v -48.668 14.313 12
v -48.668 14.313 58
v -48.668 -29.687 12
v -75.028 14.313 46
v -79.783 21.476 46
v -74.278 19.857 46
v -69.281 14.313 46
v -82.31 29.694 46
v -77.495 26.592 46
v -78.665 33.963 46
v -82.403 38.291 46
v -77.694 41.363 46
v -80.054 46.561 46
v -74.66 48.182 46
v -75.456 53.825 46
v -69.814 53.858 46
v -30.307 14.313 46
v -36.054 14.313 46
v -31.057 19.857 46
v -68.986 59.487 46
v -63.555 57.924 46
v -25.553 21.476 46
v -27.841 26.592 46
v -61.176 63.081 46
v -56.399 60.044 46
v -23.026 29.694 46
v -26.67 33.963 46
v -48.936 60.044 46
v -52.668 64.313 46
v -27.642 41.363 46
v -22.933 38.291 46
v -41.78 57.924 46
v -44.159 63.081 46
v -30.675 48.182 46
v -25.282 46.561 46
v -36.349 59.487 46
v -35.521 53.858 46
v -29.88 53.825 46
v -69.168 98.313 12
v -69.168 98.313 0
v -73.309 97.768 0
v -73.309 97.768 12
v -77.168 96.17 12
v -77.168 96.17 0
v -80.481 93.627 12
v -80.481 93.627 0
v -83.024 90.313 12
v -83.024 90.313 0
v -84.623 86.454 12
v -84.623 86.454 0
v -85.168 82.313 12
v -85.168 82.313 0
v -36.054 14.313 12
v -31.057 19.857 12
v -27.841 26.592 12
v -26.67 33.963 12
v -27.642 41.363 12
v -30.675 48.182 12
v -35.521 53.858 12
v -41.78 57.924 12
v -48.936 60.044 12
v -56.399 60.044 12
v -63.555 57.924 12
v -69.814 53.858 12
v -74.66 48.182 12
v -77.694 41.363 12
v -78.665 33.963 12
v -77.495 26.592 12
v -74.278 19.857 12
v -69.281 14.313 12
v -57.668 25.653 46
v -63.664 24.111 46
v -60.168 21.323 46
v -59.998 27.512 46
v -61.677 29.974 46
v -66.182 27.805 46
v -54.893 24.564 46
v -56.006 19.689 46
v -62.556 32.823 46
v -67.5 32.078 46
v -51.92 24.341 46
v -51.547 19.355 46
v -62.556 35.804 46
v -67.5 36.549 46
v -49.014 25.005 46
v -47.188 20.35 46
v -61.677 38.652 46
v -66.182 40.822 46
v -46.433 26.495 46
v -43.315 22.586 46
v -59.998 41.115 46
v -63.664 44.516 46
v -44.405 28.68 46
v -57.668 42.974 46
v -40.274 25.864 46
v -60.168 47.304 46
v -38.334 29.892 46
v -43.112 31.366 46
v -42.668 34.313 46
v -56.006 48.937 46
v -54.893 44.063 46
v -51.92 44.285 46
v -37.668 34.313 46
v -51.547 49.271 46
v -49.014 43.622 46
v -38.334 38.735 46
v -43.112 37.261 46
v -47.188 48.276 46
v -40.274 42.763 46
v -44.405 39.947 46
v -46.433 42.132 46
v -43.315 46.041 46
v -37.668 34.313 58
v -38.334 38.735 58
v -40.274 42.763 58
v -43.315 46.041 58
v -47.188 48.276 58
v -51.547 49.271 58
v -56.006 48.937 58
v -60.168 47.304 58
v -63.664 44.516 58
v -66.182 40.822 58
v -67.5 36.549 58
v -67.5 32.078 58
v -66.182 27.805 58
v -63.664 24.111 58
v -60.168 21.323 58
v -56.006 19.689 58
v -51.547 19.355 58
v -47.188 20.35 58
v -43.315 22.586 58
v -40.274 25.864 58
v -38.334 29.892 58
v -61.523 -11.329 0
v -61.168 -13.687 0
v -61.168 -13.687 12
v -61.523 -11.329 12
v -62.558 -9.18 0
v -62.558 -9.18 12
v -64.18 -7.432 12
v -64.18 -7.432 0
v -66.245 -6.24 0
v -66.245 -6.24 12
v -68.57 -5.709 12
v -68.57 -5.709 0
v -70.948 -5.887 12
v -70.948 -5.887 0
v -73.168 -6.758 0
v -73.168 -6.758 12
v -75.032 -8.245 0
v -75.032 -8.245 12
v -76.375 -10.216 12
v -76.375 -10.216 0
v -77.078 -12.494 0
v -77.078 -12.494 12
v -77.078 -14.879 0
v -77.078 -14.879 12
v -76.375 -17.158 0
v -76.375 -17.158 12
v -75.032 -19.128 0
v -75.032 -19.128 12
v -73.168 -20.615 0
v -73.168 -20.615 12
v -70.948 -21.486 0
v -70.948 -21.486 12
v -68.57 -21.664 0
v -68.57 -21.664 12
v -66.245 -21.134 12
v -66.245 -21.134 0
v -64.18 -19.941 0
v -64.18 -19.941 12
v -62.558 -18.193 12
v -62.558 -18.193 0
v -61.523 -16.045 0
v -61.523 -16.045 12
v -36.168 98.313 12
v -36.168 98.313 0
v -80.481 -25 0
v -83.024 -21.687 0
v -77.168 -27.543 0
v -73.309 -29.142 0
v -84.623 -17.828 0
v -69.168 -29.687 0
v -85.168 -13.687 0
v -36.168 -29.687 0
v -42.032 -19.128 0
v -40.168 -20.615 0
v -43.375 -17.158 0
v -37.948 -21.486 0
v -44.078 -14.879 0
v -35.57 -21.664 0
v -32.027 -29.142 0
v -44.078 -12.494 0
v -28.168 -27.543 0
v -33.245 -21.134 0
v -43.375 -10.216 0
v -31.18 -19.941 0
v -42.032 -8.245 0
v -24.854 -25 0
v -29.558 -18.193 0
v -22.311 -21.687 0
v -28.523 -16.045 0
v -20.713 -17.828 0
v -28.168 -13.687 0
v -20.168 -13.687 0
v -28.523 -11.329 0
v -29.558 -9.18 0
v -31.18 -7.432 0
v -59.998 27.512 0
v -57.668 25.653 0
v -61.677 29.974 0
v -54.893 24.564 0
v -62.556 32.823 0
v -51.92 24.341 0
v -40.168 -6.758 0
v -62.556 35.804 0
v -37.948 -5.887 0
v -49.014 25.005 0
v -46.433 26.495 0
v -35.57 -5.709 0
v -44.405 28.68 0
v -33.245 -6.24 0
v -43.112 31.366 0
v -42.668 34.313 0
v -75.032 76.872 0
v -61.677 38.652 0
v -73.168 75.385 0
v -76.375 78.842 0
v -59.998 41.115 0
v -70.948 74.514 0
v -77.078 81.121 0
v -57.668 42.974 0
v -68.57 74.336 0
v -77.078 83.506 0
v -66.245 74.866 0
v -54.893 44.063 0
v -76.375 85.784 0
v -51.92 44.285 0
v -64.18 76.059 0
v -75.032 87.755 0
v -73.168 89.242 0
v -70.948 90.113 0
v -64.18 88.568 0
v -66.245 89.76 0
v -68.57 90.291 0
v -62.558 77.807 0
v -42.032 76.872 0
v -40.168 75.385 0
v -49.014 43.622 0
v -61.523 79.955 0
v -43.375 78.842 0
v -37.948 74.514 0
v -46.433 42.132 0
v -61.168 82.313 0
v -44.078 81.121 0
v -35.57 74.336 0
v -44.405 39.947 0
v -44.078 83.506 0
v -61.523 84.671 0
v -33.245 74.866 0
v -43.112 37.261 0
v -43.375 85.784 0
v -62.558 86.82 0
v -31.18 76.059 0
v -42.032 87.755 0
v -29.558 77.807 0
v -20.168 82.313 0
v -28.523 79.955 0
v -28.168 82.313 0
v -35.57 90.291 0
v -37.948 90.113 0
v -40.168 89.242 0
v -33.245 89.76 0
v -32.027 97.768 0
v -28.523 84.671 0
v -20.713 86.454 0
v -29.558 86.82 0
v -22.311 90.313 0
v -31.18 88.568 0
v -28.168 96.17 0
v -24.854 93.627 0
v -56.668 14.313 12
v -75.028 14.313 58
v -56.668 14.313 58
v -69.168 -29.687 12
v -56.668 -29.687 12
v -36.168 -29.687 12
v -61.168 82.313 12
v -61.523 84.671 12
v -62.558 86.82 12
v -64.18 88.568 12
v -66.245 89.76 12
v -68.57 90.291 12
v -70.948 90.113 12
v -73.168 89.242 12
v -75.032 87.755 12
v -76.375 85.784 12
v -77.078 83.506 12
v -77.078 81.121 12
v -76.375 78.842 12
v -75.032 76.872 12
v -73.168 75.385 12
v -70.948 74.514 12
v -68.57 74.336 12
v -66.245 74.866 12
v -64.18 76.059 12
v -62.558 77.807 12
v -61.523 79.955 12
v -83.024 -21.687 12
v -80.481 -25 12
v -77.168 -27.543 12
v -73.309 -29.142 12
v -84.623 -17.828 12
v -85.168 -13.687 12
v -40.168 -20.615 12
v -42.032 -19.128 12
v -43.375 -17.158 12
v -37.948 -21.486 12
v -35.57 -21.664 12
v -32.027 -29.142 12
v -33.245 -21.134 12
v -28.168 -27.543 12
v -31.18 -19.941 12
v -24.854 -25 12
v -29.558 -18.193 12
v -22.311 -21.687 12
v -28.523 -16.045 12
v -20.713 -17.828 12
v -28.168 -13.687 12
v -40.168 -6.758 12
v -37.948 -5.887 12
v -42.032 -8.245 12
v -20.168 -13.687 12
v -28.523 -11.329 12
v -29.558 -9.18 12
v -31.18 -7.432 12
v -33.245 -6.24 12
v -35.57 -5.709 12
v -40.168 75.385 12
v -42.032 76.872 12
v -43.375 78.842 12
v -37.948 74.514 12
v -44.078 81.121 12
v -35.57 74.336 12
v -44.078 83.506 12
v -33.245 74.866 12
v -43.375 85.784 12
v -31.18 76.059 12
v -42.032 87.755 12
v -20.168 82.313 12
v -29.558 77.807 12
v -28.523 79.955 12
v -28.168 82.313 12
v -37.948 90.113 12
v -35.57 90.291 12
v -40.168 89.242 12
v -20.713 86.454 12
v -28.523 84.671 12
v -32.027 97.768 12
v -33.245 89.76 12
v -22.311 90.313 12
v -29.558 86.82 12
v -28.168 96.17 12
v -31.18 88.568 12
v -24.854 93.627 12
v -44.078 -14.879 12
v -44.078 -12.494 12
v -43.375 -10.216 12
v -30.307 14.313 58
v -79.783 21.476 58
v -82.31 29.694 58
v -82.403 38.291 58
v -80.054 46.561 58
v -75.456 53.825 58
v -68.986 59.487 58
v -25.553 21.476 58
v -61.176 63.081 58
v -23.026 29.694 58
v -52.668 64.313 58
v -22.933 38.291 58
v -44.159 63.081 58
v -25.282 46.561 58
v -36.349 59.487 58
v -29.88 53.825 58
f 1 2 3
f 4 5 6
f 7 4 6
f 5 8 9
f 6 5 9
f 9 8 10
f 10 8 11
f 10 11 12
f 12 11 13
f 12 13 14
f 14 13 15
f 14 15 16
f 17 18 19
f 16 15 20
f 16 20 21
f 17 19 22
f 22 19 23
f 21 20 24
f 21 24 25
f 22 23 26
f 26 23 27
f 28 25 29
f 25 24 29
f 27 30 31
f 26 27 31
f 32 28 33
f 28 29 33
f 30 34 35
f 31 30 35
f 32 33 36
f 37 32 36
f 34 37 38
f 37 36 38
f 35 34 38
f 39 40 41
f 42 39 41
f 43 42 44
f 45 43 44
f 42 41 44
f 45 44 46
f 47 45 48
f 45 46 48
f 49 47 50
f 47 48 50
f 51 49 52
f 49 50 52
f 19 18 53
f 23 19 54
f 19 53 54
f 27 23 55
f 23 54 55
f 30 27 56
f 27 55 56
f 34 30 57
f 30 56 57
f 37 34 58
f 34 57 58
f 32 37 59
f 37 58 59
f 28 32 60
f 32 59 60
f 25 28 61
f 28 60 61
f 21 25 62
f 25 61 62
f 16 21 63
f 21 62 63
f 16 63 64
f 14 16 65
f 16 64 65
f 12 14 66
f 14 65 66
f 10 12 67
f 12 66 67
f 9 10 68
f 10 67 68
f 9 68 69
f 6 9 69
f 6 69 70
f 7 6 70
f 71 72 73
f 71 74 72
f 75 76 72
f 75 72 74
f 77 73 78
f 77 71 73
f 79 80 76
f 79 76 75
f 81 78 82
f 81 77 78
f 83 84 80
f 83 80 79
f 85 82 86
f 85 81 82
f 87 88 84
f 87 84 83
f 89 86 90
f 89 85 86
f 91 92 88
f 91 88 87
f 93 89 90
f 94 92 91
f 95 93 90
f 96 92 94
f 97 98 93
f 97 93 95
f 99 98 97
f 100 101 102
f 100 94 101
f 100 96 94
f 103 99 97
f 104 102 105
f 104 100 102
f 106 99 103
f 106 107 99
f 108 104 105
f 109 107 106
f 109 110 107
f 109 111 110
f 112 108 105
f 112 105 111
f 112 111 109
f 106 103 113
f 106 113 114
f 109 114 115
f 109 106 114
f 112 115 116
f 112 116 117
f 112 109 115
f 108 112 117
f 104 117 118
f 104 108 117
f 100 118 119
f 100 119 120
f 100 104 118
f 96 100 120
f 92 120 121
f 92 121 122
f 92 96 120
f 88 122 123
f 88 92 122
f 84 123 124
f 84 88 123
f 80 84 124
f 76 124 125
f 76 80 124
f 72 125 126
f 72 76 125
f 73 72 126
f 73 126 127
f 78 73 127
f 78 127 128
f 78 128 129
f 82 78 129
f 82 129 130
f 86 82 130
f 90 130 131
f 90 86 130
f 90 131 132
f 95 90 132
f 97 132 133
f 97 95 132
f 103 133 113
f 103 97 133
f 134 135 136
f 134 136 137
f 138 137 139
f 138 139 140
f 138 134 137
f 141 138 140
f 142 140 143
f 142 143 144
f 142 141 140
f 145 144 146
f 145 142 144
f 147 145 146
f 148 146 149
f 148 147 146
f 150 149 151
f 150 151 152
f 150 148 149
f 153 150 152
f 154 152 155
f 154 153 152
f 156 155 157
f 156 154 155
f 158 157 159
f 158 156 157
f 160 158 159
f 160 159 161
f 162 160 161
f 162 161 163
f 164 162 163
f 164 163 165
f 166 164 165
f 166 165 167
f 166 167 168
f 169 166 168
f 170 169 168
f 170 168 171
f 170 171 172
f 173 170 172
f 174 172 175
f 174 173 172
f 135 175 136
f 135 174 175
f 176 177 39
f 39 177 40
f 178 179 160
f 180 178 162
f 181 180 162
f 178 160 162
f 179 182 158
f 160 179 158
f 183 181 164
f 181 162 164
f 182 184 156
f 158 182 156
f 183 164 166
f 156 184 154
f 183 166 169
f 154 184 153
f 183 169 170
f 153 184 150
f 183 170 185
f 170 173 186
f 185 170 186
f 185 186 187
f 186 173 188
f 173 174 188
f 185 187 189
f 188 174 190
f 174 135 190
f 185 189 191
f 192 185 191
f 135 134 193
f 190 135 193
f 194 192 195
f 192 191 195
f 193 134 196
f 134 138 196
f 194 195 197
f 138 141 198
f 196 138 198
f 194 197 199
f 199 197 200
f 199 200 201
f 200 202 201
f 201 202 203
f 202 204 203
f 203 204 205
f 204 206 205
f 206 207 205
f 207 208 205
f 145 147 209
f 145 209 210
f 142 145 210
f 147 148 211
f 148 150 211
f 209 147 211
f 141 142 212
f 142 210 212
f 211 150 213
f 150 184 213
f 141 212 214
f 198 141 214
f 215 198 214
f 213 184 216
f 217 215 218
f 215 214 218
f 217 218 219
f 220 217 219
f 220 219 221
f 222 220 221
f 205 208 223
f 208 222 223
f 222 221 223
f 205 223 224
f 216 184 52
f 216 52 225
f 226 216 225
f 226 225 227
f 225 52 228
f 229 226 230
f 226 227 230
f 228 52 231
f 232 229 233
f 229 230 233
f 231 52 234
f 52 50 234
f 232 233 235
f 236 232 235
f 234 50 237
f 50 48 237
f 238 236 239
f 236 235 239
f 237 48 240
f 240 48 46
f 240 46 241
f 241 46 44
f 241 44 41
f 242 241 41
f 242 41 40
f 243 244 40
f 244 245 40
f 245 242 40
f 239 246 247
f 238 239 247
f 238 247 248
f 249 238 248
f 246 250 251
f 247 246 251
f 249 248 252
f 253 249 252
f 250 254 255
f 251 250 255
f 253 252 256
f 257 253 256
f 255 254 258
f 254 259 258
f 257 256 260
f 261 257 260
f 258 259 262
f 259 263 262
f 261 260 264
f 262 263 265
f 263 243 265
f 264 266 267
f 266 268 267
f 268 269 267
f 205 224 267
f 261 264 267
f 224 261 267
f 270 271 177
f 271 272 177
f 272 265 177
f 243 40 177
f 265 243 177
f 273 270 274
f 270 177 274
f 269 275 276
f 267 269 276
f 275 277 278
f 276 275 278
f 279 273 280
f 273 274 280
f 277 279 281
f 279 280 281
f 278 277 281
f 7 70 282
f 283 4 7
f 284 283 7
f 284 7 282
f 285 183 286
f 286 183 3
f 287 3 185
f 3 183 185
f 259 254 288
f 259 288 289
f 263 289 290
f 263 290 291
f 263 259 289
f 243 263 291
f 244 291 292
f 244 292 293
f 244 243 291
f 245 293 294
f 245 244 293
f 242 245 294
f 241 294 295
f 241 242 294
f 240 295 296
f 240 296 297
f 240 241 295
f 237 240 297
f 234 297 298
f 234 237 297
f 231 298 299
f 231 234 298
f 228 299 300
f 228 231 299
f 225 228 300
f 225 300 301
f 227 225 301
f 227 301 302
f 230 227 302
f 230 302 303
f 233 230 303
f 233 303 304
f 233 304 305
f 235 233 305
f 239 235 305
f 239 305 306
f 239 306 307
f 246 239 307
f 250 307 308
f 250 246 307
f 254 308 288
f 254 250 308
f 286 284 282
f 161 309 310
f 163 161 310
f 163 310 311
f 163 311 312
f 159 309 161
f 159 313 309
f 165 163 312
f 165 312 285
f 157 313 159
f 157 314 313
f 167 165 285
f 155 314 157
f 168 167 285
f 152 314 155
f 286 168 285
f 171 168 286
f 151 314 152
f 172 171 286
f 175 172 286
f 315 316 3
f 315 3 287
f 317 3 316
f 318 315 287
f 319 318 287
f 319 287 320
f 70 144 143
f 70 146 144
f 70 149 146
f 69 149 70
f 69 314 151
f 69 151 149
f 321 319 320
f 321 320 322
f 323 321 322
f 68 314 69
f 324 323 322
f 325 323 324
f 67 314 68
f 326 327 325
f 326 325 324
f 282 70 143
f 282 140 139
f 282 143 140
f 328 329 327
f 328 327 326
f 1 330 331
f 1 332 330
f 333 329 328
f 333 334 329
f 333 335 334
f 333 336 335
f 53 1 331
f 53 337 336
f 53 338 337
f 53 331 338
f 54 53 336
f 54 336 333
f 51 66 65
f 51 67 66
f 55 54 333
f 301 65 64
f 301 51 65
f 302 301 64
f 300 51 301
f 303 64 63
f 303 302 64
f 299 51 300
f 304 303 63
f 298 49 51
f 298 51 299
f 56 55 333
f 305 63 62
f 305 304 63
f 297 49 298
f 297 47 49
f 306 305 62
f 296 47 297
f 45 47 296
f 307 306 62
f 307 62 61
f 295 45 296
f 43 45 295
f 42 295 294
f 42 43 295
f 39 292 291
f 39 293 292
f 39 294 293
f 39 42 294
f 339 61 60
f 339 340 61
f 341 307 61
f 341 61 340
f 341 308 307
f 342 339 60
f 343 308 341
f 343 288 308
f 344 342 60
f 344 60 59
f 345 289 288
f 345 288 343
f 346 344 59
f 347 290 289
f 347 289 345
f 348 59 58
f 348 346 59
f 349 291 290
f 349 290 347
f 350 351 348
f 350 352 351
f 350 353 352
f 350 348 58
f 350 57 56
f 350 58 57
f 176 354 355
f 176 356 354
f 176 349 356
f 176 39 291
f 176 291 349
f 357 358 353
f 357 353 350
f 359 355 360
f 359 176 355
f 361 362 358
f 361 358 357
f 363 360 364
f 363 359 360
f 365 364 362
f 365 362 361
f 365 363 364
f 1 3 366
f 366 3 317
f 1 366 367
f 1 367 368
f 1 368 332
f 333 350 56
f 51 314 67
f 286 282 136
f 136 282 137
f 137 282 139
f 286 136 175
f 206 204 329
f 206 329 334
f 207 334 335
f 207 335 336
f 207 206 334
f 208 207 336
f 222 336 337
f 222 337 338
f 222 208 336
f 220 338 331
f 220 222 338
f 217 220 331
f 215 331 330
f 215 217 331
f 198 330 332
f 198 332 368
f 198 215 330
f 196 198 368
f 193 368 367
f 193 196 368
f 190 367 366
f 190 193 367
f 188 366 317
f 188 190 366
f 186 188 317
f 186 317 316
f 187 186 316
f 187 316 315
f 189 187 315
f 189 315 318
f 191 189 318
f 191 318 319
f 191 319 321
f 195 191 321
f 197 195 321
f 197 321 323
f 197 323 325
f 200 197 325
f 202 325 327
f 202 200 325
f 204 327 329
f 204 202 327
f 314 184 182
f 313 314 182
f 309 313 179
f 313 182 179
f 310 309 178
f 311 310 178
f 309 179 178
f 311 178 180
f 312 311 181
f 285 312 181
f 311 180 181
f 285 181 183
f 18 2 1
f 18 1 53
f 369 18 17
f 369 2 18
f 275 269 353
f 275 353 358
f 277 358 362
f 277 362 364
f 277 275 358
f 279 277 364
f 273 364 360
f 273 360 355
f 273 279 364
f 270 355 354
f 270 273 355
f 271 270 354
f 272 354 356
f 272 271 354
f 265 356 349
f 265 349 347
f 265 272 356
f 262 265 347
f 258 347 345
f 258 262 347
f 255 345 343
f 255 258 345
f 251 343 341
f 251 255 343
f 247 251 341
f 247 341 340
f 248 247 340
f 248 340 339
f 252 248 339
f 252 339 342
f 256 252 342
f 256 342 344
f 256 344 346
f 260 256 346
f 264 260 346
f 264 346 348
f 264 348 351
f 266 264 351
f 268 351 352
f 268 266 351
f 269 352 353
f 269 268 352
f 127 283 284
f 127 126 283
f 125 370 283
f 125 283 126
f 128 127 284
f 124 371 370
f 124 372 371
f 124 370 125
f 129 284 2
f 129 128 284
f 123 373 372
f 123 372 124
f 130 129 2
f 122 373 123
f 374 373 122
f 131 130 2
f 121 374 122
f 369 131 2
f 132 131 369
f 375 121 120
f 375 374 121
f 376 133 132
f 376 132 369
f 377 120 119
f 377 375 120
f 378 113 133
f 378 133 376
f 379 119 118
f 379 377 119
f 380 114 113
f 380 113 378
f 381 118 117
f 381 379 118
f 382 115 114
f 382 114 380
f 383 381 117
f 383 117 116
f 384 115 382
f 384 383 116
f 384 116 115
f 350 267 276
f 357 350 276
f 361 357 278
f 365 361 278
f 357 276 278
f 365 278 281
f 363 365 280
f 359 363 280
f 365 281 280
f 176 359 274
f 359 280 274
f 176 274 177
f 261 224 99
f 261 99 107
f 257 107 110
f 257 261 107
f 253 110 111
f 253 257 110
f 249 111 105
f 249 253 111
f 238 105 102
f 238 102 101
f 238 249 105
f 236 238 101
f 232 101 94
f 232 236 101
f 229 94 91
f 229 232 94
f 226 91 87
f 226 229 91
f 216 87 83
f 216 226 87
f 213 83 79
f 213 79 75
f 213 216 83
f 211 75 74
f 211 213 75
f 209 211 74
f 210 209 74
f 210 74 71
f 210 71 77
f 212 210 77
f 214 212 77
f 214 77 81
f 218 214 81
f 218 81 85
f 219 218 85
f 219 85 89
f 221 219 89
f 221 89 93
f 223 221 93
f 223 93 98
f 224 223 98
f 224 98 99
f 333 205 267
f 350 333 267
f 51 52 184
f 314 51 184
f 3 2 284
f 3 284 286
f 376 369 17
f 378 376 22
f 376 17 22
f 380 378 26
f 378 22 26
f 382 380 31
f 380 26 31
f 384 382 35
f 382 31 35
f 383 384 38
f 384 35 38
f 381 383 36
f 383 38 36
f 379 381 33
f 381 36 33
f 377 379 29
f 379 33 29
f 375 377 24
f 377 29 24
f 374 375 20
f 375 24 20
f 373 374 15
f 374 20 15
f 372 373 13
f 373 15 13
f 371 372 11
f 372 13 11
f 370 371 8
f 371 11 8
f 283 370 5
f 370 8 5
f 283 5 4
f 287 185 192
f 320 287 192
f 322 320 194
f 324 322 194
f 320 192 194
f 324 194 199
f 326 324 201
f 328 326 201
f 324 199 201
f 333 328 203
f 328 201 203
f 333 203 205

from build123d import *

# Parameters (mm, degrees)
IZIM1_R                     = 8
Y_KSEKLIK_EKSTR_ZYON2_DEPTH = 12
IZIM2_R                     = 26
IZIM2_R_2                   = 10
Y_KSEKLIK_EKSTR_ZYON3_DEPTH = 34
KES_EKSTR_ZYON1_START       = -34
IZIM3_R                     = 10
KES_EKSTR_ZYON1_DEPTH       = 34
IZIM4_R                     = 30
IZIM4_R_2                   = 15
Y_KSEKLIK_EKSTR_ZYON4_DEPTH = 12
IZIM6_W                     = 47.489367516
IZIM6_H                     = 14.251313653
KES_EKSTR_ZYON2_DEPTH       = 46
FEDER1_REACH                = 120.683
IZIM9_WALL_W                = 303.022183262
IZIM9_WALL_H                = 8


with BuildPart() as part:
    # Çizim1 → Yükseklik-Ekstrüzyon2 (new body)
    with BuildSketch(Plane.XY):
        with BuildLine():
            Line((-85.16772712, 82.313308987), (-85.16772712, -13.686691013))
            ThreePointArc((-85.16772712, -13.686691013), (-80.481435619, -25.000399512), (-69.16772712, -29.686691013))
            Line((-69.16772712, -29.686691013), (-36.16772712, -29.686691013))
            ThreePointArc((-36.16772712, -29.686691013), (-24.854018621, -25.000399512), (-20.16772712, -13.686691013))
            Line((-20.16772712, -13.686691013), (-20.16772712, 82.313308987))
            ThreePointArc((-20.16772712, 82.313308987), (-24.854018621, 93.627017486), (-36.16772712, 98.313308987))
            Line((-36.16772712, 98.313308987), (-69.16772712, 98.313308987))
            ThreePointArc((-69.16772712, 98.313308987), (-80.481435619, 93.627017486), (-85.16772712, 82.313308987))
        make_face()
        with Locations((-69.16772712, 82.313308987)):
            Circle(IZIM1_R, mode=Mode.SUBTRACT)
        with Locations((-36.16772712, 82.313308987)):
            Circle(IZIM1_R, mode=Mode.SUBTRACT)
        with Locations((-69.16772712, -13.686691013)):
            Circle(IZIM1_R, mode=Mode.SUBTRACT)
        with Locations((-36.16772712, -13.686691013)):
            Circle(IZIM1_R, mode=Mode.SUBTRACT)
    extrude(amount=Y_KSEKLIK_EKSTR_ZYON2_DEPTH)

    # Çizim2 → Yükseklik-Ekstrüzyon3 (add)
    with BuildSketch(Plane.XY.offset(12)):
        with Locations((-52.66772712, 34.313308987)):
            Circle(IZIM2_R)
        with Locations((-52.66772712, 34.313308987)):
            Circle(IZIM2_R_2, mode=Mode.SUBTRACT)
    extrude(amount=Y_KSEKLIK_EKSTR_ZYON3_DEPTH)

    # Çizim3 → Kes-Ekstrüzyon1 (cut)
    with BuildSketch(Plane.XY.offset(12).offset(KES_EKSTR_ZYON1_START)):
        with Locations((-52.66772712, 34.313308987)):
            Circle(IZIM3_R)
    extrude(amount=KES_EKSTR_ZYON1_DEPTH, mode=Mode.SUBTRACT)

    # Çizim4 → Yükseklik-Ekstrüzyon4 (add)
    with BuildSketch(Plane.XY.offset(46)):
        with Locations((-52.66772712, 34.313308987)):
            Circle(IZIM4_R)
        with Locations((-52.66772712, 34.313308987)):
            Circle(IZIM4_R_2, mode=Mode.SUBTRACT)
    extrude(amount=Y_KSEKLIK_EKSTR_ZYON4_DEPTH)

    # Çizim6 → Kes-Ekstrüzyon2 (cut)
    with BuildSketch(Plane.XY.offset(58)):
        with Locations((-51.283723137, 7.187652161)):
            Rectangle(IZIM6_W, IZIM6_H)
    extrude(amount=-KES_EKSTR_ZYON2_DEPTH, mode=Mode.SUBTRACT)

    # Çizim9 wall → Feder1 (add, up to next)
    with BuildSketch(Plane(origin=(-52.66772712, -7.686691013, 35), x_dir=(0, -0.691222645967, -0.722641857148), z_dir=(0, -0.722641857148, 0.691222645967)), mode=Mode.PRIVATE) as feder1_sk1:
        Rectangle(IZIM9_WALL_W, IZIM9_WALL_H)
    feder1_tool1 = extrude(feder1_sk1.sketch, amount=-FEDER1_REACH, mode=Mode.PRIVATE) - part.part
    add(feder1_tool1.solids().sort_by_distance((-52.66772712, -7.686691013, 35))[0])


solid = part.part
